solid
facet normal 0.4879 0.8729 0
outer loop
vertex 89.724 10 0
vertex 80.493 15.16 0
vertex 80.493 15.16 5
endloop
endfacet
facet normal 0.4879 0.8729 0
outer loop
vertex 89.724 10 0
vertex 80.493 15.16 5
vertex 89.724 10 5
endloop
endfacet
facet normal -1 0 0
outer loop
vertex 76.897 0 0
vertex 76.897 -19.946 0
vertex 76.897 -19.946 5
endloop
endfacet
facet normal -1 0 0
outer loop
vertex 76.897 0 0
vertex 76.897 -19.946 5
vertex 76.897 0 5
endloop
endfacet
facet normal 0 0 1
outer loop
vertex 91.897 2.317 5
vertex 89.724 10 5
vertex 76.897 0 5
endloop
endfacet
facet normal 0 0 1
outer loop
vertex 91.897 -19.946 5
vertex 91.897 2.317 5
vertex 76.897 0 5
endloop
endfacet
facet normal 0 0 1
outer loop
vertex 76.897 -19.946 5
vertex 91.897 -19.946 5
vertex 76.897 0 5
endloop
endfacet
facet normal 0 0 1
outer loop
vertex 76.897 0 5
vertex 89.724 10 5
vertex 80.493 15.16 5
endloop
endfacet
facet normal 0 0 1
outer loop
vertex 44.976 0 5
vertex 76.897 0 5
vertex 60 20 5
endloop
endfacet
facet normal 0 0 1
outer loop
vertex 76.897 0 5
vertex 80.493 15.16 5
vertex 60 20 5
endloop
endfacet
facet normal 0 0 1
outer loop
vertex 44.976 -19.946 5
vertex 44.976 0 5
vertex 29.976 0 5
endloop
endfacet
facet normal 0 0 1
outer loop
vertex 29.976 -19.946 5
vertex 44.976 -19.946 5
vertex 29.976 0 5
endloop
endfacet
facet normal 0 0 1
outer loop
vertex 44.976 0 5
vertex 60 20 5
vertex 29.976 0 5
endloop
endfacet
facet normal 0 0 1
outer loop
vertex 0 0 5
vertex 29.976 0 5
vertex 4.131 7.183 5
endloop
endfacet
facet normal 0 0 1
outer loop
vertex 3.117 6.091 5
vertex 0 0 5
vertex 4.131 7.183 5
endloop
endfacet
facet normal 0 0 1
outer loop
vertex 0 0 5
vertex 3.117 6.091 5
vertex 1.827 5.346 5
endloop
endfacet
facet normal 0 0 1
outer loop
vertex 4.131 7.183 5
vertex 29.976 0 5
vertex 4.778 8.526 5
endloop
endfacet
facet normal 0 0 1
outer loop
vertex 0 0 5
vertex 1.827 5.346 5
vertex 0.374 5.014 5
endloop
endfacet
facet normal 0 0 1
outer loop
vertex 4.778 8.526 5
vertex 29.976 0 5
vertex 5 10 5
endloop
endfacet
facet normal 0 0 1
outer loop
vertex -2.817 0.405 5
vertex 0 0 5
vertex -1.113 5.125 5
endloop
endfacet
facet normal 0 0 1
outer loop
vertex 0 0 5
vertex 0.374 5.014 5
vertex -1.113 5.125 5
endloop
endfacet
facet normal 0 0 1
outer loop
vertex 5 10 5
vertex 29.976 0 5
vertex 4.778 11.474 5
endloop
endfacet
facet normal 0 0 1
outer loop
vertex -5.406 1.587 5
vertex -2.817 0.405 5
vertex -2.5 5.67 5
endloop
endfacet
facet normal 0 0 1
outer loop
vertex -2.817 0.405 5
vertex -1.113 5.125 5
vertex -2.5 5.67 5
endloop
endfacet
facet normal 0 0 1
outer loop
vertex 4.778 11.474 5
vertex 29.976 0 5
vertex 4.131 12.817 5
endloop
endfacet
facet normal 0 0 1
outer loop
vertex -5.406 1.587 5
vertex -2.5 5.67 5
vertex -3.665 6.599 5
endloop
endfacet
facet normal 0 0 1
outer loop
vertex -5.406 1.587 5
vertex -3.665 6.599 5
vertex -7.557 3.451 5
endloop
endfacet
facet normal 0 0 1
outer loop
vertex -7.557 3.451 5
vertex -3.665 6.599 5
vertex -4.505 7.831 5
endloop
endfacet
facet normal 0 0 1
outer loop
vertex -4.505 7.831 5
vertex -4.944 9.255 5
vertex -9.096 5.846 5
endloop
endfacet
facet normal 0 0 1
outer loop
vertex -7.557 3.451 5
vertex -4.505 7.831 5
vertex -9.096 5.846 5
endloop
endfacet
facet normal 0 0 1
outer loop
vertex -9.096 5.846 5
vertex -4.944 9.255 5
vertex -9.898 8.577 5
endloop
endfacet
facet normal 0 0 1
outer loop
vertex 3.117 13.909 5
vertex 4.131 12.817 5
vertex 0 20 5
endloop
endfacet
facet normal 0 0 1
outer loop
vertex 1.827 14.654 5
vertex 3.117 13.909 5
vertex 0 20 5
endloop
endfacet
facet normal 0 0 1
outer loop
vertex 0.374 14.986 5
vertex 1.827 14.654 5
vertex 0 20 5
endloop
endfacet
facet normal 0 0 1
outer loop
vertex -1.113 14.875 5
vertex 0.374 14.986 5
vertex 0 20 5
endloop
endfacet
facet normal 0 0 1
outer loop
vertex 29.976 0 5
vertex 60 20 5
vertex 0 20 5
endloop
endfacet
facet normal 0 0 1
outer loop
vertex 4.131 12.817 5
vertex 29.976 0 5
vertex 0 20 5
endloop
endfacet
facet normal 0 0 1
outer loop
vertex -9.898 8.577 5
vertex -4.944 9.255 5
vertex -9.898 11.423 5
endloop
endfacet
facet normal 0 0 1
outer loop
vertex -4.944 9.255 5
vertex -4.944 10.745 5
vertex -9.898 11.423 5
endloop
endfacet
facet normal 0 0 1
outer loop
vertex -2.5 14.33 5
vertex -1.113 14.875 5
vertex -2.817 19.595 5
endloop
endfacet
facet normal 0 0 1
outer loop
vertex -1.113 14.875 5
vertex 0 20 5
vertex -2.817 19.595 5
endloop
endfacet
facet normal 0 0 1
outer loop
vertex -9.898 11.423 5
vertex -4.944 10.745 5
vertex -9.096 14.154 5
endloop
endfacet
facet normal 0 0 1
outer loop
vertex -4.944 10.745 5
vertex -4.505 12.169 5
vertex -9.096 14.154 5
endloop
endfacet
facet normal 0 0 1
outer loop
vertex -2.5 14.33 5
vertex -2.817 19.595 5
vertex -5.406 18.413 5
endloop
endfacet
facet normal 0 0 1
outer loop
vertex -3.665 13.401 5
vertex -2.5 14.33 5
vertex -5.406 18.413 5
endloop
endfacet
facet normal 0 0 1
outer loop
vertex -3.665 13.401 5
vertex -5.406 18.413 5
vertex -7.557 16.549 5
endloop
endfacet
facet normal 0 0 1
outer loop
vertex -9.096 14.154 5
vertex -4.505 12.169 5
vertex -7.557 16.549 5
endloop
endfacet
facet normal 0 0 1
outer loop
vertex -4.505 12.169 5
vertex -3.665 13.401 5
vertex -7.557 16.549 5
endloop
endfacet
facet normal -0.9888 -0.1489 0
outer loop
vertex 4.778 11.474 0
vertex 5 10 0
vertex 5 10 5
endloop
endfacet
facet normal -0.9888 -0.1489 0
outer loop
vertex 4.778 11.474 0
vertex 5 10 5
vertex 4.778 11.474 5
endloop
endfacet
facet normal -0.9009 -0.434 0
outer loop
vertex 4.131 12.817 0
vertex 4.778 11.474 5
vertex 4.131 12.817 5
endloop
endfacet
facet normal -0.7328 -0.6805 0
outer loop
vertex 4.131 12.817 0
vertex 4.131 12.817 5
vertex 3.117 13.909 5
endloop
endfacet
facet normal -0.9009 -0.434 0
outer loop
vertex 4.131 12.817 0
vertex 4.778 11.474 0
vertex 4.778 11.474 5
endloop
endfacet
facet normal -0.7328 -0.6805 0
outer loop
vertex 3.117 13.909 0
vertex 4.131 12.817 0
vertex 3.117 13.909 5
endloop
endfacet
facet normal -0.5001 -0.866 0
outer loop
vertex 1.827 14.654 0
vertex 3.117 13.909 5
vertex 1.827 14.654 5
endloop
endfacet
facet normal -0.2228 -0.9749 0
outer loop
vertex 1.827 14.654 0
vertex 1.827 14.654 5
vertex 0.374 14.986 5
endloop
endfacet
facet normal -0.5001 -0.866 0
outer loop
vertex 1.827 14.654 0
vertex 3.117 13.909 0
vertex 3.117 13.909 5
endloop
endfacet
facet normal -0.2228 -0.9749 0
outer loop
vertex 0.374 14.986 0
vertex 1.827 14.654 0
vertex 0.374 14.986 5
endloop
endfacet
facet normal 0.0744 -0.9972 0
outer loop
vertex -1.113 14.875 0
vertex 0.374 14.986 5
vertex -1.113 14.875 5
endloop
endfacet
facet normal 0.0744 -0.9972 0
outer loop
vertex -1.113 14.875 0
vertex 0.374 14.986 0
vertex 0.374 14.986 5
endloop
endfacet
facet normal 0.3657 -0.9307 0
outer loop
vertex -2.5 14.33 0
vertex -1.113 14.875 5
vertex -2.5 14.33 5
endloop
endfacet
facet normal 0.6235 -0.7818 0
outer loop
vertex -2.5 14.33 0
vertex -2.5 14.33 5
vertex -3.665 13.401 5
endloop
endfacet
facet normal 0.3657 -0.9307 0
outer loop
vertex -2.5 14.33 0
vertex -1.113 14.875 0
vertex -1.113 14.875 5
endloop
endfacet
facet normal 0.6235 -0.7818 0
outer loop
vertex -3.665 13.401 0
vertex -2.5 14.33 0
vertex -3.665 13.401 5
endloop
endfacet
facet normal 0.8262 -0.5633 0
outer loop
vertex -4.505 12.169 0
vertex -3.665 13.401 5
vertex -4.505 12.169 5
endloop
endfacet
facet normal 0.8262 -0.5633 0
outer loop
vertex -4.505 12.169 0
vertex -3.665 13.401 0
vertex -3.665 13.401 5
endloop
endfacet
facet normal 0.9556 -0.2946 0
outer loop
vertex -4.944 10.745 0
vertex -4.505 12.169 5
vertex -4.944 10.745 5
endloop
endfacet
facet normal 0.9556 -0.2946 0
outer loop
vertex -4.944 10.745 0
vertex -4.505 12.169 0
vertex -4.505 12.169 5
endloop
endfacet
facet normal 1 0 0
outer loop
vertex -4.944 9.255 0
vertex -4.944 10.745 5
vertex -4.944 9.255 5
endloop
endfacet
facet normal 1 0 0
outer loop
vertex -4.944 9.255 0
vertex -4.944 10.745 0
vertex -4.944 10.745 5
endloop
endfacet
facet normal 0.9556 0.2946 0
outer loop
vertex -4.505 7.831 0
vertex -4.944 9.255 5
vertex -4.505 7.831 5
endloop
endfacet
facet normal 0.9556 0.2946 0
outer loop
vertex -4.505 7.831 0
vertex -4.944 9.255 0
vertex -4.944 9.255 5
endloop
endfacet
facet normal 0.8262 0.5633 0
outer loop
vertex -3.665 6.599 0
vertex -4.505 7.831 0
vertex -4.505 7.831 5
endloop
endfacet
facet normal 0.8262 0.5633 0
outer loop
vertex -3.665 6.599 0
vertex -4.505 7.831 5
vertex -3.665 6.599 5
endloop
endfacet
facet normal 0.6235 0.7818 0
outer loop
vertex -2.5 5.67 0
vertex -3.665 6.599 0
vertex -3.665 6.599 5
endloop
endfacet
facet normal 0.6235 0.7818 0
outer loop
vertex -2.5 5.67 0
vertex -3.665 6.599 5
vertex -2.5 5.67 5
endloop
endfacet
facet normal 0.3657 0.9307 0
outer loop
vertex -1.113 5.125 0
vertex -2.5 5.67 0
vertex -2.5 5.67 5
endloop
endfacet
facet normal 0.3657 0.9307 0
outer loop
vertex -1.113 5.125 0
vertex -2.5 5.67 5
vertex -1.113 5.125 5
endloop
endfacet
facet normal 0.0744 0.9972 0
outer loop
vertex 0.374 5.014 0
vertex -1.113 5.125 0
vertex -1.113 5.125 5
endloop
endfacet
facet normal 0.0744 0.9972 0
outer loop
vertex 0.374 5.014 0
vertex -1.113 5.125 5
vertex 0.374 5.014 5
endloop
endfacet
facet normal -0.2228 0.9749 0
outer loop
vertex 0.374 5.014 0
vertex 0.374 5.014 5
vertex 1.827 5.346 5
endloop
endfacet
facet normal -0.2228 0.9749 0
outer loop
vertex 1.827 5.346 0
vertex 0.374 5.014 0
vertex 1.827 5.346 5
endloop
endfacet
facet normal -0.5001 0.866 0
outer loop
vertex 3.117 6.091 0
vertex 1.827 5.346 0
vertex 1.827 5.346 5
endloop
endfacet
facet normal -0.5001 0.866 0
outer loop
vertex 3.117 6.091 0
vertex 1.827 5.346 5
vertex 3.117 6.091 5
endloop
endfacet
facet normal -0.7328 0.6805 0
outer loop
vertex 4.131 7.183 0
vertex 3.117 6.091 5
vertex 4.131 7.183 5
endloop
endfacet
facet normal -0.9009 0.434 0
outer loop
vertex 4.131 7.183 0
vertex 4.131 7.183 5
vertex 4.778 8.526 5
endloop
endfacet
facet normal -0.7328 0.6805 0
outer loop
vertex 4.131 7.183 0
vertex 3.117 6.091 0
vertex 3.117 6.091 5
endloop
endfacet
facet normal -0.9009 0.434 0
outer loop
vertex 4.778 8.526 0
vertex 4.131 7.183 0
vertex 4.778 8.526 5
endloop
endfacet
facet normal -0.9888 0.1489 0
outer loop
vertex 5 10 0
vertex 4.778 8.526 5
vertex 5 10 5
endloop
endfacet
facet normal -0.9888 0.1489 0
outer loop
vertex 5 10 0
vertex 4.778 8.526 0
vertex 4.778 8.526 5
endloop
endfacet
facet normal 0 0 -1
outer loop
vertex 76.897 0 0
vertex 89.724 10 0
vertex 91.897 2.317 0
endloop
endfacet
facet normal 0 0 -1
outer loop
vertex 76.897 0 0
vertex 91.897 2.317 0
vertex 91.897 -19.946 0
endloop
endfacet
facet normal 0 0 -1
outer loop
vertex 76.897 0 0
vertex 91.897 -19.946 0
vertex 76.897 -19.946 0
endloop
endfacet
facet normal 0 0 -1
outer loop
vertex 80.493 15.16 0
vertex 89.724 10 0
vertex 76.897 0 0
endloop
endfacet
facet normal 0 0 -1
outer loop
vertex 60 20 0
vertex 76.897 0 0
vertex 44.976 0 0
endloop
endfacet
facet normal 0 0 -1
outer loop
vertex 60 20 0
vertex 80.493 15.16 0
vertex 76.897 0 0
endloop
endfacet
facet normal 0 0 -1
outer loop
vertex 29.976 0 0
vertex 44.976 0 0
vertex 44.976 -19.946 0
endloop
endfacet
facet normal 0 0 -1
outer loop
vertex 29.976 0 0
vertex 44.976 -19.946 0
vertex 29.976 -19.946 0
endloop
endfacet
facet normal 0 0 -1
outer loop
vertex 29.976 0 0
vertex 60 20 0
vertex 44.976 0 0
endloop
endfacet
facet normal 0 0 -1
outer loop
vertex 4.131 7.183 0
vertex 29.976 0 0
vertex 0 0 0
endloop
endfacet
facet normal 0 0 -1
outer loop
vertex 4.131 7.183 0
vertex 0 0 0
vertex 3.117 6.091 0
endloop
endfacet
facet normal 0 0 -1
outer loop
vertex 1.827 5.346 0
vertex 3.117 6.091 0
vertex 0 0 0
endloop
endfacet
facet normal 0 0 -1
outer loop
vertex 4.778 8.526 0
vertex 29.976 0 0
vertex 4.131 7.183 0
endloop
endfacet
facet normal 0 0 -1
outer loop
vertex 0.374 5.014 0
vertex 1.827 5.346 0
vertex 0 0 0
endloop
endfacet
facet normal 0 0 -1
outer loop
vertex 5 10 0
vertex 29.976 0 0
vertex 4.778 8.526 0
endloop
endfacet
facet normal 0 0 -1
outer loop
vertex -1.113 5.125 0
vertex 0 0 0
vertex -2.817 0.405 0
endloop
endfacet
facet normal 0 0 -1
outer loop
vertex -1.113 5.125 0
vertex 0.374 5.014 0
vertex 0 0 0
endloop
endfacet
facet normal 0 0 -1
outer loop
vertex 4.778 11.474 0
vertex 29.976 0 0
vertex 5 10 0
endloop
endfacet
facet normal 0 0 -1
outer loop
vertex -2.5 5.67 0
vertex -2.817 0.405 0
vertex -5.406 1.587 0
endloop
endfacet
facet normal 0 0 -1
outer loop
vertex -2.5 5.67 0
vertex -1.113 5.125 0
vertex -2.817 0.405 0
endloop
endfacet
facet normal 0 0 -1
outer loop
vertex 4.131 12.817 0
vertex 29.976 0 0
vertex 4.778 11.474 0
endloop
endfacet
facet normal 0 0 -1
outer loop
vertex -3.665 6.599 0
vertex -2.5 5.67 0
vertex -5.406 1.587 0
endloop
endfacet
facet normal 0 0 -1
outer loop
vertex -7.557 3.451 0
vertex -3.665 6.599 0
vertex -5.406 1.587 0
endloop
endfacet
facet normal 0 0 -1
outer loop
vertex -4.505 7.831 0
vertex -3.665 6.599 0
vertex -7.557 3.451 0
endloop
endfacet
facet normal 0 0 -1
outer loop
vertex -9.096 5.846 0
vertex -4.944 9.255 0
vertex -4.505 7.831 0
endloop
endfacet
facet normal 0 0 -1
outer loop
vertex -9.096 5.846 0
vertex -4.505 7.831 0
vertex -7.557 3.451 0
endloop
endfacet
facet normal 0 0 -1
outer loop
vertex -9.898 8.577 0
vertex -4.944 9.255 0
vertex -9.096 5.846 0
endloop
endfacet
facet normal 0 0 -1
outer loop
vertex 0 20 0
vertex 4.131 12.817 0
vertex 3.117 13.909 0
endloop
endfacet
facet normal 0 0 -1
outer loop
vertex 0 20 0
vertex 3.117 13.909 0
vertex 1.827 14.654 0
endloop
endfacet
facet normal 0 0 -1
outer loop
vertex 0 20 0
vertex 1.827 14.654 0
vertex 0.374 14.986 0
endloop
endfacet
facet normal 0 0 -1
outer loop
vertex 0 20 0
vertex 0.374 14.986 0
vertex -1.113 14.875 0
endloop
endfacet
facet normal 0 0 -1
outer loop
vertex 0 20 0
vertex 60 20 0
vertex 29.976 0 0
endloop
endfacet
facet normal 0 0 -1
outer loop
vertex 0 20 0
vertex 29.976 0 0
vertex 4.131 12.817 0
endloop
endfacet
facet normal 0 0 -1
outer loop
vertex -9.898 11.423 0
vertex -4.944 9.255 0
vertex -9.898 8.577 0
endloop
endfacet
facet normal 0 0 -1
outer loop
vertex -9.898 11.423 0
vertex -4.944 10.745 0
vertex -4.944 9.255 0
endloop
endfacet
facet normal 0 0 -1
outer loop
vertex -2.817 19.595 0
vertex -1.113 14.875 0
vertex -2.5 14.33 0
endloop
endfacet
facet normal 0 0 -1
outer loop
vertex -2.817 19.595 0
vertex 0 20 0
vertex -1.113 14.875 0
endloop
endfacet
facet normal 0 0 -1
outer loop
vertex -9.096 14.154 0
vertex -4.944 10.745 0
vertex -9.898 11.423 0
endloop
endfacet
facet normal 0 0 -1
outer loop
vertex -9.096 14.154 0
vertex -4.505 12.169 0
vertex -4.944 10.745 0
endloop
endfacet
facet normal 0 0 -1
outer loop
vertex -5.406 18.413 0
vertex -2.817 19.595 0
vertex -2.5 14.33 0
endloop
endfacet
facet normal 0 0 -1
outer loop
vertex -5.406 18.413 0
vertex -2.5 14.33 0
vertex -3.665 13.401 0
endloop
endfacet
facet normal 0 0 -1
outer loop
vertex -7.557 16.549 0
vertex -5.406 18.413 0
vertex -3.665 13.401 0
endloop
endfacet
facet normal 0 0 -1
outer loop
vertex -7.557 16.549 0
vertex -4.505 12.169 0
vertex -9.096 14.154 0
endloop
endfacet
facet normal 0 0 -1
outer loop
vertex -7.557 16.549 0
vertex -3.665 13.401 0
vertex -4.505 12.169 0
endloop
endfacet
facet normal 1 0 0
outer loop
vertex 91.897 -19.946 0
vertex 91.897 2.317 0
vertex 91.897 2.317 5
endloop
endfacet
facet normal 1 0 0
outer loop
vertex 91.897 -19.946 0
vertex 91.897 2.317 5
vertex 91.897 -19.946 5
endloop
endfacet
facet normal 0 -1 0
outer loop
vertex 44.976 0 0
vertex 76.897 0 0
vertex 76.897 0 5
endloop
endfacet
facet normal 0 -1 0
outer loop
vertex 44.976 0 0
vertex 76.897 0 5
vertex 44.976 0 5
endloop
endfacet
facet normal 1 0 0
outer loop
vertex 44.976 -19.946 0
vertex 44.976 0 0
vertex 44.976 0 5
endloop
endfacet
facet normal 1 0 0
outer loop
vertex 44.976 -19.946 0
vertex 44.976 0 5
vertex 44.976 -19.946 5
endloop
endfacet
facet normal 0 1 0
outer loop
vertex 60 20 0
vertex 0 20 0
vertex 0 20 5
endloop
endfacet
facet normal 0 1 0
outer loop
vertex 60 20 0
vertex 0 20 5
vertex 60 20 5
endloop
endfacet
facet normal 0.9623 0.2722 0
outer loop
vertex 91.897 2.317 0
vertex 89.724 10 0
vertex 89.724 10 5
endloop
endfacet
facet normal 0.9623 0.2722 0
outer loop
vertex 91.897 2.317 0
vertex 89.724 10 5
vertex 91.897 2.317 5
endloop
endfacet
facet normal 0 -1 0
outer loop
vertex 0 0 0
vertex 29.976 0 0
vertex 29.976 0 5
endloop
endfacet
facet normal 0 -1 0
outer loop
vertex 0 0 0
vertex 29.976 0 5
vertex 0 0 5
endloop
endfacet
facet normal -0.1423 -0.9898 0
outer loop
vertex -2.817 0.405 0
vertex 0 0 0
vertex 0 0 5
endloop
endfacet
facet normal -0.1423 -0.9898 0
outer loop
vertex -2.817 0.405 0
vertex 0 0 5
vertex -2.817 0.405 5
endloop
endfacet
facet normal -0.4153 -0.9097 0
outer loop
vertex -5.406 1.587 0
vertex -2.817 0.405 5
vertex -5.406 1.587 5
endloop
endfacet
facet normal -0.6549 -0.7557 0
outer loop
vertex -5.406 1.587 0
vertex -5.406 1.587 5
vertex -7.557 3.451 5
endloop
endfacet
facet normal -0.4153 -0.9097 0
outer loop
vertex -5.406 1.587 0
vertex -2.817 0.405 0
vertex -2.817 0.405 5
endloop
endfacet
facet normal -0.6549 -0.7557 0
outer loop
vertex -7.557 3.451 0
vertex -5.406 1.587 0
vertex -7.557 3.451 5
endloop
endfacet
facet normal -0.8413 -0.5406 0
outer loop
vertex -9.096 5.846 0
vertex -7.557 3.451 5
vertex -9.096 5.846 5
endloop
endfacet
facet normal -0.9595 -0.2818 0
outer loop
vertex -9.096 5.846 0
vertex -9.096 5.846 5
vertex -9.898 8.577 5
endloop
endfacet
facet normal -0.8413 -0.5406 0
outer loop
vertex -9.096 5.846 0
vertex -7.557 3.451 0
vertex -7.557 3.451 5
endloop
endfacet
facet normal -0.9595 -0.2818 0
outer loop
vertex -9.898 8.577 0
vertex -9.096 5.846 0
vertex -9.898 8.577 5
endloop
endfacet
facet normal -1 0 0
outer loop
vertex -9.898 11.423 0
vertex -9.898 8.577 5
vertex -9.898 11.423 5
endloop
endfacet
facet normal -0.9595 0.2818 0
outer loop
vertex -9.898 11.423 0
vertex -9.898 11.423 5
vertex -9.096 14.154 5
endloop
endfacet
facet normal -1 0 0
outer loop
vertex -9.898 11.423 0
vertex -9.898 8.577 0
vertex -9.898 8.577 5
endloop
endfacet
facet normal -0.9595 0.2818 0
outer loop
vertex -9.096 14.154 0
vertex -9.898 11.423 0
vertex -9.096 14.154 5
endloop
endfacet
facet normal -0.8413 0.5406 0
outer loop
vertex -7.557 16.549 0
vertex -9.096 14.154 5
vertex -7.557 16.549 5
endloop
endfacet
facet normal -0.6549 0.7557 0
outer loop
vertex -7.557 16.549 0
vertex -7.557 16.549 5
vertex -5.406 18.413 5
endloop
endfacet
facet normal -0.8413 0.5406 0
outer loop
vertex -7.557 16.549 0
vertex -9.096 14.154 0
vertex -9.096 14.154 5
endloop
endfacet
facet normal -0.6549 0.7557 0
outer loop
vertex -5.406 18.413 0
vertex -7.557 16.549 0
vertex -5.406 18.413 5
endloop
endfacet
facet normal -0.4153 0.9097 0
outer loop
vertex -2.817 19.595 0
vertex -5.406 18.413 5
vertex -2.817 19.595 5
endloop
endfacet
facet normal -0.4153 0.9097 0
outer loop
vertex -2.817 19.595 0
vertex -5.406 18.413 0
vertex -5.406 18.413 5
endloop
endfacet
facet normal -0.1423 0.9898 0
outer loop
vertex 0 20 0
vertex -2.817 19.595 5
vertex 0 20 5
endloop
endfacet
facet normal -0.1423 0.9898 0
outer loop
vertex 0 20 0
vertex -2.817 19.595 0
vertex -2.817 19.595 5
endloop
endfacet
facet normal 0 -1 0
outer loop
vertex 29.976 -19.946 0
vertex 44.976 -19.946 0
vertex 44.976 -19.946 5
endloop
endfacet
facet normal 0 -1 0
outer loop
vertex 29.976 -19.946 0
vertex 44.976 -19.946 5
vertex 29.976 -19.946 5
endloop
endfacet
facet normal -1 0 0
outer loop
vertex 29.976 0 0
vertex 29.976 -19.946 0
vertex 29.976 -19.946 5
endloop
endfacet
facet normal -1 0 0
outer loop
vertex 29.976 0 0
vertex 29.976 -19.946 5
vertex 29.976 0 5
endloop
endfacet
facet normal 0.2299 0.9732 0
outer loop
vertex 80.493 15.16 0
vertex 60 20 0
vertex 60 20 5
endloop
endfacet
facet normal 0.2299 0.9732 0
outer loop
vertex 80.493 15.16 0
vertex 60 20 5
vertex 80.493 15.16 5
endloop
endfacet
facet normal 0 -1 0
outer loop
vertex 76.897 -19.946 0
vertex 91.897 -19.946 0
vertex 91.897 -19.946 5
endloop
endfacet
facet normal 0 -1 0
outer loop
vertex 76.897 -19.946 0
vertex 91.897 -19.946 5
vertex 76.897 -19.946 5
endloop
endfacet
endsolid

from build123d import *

# Parameters (mm, degrees)
SKETCH1_R           = 5
BOSS_EXTRUDE1_DEPTH = 5


with BuildPart() as part:
    # Sketch1 → Boss-Extrude1 (new body)
    with BuildSketch(Plane.XY):
        with BuildLine():
            Line((0, 20), (60, 20))
            Line((60, 20), (80.493425393, 15.160264355))
            Line((80.493425393, 15.160264355), (89.723935177, 10))
            Line((89.723935177, 10), (91.89696936, 2.317012659))
            Line((91.89696936, 2.317012659), (91.89696936, -19.946286041))
            Line((91.89696936, -19.946286041), (76.89696936, -19.946286041))
            Line((76.89696936, -19.946286041), (76.89696936, 0))
            Line((76.89696936, 0), (44.976259551, 0))
            Line((44.976259551, 0), (44.976259551, -19.946286041))
            Line((44.976259551, -19.946286041), (29.976259551, -19.946286041))
            Line((29.976259551, -19.946286041), (29.976259551, 0))
            Line((29.976259551, 0), (0, 0))
            ThreePointArc((0, 0), (-10, 10), (0, 20))
        make_face()
        with Locations((0, 10)):
            Circle(SKETCH1_R, mode=Mode.SUBTRACT)
    extrude(amount=BOSS_EXTRUDE1_DEPTH)


solid = part.part
